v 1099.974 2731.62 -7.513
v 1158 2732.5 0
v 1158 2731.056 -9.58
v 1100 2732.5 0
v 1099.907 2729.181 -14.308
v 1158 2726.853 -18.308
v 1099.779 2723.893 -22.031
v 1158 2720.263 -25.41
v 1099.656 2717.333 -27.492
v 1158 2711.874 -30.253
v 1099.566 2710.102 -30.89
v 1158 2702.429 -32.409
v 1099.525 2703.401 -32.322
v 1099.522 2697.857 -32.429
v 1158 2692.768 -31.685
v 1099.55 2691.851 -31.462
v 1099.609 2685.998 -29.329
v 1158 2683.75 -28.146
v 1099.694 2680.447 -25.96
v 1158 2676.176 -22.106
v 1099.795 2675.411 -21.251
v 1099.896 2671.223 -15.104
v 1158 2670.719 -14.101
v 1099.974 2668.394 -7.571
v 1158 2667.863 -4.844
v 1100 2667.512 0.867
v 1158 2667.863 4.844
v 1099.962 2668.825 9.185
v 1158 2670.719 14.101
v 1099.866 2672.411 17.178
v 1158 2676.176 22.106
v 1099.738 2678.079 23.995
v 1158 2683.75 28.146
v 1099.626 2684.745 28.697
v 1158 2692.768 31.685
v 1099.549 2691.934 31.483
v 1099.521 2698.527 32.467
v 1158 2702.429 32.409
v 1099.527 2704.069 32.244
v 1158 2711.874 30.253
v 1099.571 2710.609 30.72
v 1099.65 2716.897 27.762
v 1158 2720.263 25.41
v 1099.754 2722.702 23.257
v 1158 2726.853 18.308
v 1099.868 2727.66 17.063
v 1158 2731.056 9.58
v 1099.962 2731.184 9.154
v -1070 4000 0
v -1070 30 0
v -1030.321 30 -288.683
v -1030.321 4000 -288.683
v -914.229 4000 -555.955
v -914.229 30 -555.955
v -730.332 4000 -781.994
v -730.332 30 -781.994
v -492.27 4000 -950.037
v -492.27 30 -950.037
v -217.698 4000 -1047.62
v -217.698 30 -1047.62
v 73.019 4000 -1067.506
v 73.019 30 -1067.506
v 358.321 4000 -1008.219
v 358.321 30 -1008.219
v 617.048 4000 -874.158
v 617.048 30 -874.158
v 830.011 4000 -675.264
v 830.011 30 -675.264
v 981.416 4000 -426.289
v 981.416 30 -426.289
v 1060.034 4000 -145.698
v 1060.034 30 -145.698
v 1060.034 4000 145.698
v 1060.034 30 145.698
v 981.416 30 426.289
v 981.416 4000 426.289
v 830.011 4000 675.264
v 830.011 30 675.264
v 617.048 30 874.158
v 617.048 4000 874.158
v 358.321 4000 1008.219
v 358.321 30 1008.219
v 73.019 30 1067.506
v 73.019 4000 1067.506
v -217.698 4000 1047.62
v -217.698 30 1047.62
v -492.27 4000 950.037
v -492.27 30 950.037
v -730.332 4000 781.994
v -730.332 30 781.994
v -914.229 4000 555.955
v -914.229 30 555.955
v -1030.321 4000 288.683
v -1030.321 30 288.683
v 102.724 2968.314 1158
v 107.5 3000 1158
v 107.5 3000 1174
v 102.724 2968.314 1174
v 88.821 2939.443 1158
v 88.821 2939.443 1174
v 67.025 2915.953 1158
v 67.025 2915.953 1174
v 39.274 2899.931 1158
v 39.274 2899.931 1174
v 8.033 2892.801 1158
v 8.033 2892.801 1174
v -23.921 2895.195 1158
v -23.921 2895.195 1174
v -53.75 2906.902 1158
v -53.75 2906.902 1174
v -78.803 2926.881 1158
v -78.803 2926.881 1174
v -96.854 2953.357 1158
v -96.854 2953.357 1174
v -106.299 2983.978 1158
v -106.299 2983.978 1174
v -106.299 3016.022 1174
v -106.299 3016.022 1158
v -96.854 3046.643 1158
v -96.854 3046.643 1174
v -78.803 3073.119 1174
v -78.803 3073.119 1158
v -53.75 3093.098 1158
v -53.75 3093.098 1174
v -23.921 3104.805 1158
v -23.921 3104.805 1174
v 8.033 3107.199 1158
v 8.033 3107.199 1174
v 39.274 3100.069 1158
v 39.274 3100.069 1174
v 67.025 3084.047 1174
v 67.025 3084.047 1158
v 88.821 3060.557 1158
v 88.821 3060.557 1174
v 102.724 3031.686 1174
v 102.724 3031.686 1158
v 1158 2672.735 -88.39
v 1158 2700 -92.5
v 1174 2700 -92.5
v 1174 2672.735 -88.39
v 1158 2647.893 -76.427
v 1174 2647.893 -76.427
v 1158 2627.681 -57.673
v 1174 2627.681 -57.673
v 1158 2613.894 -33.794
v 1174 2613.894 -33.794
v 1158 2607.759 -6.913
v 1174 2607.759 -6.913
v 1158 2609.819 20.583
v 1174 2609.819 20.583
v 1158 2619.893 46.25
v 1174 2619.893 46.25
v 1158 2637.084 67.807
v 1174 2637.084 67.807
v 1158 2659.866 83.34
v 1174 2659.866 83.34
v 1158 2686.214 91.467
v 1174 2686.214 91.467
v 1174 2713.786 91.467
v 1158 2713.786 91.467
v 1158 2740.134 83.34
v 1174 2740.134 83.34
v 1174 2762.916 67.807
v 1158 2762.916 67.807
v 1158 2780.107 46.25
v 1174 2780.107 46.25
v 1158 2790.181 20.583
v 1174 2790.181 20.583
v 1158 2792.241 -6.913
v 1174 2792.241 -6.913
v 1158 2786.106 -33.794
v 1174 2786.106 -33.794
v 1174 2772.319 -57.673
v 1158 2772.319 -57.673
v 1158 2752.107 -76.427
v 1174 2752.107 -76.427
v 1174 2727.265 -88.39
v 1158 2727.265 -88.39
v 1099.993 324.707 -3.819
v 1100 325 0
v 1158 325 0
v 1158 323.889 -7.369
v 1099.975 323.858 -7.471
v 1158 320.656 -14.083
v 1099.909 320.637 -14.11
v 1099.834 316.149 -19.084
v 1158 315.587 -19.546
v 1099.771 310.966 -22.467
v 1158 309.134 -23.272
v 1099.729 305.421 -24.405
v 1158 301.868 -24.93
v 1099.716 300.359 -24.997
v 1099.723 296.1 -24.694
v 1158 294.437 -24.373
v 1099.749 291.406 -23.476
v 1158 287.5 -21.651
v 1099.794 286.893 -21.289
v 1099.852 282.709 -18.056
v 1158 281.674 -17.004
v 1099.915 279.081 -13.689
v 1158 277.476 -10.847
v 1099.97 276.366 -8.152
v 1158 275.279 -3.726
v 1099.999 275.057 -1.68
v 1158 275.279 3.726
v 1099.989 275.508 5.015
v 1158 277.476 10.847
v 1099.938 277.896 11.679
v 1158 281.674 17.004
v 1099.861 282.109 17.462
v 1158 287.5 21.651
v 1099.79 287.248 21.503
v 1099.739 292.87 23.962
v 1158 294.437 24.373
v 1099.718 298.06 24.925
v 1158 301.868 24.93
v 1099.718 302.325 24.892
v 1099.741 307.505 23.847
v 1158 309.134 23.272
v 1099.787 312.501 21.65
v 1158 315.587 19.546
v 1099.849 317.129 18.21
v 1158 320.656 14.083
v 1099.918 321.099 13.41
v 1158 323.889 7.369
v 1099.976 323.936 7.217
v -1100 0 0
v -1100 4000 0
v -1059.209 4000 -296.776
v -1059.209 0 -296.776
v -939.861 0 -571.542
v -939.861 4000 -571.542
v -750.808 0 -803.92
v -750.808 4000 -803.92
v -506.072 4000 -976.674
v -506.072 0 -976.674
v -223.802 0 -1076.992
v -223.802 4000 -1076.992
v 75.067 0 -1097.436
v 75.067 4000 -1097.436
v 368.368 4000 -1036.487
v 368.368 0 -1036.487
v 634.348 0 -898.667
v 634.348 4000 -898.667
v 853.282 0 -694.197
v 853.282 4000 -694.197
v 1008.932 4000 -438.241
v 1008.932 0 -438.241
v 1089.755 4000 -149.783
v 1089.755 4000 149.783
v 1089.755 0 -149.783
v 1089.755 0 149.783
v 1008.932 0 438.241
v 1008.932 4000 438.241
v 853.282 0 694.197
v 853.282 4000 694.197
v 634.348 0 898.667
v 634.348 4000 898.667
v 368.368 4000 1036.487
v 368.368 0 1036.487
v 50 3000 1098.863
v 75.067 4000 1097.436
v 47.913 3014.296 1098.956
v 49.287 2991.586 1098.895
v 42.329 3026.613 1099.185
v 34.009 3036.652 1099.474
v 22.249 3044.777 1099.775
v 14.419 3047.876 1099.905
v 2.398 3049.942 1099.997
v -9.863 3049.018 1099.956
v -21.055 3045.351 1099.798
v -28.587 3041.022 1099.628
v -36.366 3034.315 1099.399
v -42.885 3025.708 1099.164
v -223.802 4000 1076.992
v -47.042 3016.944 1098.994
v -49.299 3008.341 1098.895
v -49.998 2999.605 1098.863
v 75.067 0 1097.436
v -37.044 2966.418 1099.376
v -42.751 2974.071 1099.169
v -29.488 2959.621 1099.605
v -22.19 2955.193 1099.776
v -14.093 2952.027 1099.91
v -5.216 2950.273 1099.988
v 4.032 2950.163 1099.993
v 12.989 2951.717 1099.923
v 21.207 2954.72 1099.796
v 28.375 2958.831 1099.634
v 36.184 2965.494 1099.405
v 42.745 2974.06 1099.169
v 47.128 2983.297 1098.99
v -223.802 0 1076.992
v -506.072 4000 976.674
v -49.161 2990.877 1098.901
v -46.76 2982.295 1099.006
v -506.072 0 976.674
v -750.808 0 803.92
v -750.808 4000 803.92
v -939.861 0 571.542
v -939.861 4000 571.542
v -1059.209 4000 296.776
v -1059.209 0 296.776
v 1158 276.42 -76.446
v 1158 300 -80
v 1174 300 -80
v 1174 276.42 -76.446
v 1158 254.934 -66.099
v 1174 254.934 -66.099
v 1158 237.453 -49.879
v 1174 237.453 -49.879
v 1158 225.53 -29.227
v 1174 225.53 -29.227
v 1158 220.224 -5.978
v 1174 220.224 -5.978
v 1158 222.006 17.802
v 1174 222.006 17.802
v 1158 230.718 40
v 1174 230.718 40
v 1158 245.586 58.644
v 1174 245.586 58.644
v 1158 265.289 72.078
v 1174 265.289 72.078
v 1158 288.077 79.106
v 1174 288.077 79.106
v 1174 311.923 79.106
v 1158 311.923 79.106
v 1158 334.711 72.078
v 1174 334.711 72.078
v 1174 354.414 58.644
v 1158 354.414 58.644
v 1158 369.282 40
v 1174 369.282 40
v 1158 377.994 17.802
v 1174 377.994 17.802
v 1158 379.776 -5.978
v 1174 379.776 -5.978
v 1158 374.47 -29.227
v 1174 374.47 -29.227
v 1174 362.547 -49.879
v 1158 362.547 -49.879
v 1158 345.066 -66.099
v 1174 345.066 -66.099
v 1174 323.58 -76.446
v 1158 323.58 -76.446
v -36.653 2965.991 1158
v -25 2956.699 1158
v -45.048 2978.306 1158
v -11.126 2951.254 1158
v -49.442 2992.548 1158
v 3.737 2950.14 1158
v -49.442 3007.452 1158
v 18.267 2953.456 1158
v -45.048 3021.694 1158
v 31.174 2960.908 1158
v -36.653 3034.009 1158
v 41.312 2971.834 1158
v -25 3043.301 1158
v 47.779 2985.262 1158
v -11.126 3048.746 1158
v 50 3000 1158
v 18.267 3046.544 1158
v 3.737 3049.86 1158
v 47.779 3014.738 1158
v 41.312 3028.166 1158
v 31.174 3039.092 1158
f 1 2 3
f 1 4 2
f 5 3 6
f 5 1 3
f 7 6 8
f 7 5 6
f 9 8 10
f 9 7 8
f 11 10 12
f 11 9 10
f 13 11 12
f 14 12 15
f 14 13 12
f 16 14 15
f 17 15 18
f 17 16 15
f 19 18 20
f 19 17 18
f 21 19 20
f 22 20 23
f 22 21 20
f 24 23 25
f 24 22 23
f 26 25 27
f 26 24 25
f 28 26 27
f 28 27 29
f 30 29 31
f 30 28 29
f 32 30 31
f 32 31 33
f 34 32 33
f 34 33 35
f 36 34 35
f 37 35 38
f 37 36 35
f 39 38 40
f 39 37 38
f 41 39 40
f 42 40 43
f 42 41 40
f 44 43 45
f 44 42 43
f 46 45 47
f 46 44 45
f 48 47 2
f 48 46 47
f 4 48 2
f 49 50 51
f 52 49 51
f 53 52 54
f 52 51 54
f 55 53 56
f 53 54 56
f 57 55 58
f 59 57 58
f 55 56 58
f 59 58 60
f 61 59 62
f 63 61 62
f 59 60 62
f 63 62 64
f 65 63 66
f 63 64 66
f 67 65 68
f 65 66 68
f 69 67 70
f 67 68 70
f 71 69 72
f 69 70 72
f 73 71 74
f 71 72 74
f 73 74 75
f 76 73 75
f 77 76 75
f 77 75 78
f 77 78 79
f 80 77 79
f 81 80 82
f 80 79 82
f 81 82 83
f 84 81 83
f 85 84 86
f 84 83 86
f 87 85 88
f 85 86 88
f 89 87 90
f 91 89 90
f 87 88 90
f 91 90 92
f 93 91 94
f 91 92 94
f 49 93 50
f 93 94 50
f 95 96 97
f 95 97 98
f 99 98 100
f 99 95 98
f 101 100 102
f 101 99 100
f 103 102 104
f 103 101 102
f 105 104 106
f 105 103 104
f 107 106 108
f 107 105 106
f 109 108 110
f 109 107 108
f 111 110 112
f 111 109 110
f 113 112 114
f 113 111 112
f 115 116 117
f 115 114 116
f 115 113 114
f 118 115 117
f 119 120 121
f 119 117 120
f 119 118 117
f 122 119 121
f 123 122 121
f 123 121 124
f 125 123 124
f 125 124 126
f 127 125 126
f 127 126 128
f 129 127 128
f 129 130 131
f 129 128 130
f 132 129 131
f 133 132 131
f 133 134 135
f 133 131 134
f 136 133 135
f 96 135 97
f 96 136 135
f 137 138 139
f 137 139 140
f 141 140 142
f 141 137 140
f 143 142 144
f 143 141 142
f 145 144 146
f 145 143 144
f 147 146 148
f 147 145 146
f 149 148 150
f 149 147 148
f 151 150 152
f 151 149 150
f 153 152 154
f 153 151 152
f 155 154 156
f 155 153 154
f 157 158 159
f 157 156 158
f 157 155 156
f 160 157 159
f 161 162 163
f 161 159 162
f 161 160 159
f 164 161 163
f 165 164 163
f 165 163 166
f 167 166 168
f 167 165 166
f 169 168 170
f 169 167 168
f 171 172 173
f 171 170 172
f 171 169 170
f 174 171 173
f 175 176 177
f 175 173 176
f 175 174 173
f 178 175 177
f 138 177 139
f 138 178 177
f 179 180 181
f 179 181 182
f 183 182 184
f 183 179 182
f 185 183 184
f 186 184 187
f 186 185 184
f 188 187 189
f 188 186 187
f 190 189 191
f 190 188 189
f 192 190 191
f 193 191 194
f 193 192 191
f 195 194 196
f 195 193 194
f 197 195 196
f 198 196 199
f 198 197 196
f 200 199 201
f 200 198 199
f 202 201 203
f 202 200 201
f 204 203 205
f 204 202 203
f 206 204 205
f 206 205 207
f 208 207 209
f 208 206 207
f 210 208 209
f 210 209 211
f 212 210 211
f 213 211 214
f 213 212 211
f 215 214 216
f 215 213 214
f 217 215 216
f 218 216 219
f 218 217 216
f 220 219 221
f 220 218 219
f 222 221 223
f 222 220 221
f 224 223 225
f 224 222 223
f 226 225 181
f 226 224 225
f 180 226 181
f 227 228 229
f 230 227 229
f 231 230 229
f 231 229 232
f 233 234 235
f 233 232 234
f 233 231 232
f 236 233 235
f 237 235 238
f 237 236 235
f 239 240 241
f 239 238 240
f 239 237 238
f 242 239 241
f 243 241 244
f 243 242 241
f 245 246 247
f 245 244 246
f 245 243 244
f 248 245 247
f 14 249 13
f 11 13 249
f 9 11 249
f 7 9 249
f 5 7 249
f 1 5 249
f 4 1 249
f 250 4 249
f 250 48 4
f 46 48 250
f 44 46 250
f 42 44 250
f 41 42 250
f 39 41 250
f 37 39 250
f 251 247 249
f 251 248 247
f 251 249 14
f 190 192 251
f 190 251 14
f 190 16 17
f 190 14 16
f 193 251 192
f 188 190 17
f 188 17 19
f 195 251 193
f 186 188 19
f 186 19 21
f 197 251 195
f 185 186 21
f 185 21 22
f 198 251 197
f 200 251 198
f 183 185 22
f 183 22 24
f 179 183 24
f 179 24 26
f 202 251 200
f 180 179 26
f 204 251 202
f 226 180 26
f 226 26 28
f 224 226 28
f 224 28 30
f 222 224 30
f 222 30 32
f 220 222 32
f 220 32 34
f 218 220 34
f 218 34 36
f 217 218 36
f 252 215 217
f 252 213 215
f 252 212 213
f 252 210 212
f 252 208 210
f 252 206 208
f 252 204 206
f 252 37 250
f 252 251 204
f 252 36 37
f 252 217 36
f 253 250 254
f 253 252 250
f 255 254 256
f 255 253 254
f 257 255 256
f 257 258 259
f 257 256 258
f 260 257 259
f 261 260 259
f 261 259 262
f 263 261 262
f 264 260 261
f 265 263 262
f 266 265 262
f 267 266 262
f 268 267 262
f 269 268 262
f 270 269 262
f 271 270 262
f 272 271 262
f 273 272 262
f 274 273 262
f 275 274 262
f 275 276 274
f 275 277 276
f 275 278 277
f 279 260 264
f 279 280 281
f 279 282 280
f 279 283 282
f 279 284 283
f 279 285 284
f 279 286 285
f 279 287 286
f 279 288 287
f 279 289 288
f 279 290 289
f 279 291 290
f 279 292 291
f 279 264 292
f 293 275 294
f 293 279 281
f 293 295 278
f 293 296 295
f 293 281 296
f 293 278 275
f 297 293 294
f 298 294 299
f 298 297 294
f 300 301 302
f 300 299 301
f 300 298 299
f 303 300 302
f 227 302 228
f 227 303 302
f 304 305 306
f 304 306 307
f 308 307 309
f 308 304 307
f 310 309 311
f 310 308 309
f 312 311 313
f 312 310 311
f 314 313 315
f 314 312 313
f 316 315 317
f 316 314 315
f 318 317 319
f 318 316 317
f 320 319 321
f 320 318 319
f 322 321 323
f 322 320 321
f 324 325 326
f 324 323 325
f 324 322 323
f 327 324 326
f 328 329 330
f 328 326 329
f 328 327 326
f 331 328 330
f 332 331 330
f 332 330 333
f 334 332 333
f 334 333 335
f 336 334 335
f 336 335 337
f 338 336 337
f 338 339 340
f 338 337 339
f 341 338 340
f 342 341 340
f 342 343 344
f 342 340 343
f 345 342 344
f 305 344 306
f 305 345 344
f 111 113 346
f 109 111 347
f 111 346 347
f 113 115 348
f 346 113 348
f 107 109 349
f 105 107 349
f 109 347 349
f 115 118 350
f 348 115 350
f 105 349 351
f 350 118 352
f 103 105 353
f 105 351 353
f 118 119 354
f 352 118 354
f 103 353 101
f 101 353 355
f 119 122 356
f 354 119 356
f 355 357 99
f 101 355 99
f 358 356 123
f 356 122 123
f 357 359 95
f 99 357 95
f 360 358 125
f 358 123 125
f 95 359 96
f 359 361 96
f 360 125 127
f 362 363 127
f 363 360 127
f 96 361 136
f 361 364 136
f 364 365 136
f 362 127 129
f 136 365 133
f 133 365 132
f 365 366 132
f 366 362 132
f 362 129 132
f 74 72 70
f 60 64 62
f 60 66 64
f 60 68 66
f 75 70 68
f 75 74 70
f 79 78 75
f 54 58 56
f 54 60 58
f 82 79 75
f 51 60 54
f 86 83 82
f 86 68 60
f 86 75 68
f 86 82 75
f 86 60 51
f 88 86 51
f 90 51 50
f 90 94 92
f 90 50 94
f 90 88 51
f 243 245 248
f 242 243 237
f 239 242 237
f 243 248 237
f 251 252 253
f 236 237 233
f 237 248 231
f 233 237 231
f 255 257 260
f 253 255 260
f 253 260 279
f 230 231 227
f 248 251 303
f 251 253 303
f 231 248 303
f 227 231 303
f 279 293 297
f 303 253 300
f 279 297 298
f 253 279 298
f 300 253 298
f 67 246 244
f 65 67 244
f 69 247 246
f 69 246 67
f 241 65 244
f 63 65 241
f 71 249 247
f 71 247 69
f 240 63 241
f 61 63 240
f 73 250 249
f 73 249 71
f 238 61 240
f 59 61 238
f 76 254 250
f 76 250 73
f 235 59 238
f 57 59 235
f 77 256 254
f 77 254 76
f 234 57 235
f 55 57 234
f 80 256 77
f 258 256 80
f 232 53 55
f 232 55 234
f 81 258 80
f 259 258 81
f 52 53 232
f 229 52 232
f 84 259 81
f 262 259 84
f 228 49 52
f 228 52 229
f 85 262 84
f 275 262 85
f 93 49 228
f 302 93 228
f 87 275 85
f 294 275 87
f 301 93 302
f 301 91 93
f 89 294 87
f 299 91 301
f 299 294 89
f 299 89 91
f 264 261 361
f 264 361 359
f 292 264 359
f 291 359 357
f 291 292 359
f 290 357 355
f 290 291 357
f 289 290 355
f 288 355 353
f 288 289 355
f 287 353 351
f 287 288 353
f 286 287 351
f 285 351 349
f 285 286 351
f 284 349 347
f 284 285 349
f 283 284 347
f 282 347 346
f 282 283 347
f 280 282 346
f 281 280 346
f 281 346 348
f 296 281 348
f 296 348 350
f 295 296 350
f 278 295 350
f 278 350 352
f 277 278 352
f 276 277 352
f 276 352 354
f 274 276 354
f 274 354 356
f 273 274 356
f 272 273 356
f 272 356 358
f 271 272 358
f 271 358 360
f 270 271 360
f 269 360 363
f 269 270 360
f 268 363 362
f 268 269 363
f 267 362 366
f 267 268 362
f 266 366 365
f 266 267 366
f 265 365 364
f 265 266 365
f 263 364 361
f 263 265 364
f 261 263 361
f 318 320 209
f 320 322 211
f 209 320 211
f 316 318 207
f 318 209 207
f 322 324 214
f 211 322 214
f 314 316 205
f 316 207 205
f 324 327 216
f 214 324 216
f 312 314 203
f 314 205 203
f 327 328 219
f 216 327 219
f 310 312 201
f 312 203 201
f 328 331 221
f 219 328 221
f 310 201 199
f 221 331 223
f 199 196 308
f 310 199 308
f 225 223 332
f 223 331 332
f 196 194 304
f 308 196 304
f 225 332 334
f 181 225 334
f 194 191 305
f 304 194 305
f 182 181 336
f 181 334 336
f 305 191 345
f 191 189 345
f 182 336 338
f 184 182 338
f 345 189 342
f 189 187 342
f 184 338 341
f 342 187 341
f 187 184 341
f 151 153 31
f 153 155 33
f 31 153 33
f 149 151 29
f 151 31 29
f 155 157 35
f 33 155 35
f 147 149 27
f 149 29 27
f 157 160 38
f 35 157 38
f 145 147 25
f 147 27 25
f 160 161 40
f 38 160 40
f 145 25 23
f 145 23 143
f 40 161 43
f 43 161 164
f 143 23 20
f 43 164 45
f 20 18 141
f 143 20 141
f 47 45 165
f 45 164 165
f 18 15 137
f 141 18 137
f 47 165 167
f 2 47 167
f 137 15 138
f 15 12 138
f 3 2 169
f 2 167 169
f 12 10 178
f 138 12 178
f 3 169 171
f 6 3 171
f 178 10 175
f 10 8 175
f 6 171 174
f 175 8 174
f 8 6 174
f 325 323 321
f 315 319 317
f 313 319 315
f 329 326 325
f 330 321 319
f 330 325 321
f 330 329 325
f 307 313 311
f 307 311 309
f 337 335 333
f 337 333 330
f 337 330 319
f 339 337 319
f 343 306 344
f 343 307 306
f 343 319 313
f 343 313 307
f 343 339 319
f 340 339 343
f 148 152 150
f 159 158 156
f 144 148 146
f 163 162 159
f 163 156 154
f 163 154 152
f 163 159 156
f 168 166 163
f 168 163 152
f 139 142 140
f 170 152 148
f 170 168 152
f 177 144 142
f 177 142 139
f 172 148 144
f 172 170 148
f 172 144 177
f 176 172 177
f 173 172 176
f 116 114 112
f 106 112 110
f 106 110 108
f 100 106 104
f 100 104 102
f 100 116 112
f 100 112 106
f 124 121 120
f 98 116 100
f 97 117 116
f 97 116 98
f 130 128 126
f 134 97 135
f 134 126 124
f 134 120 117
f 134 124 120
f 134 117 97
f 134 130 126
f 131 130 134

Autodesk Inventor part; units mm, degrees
ref_plane "XZ Plane" through (0, 0, 0) normal (0, 1, 0) x (-1, 0, 0)
sketch "Sketch1" plane through (0, 0, 0) normal (0, 1, 0) x (-1, 0, 0)
  circle A0 centre (0, 0) radius 1100
  dimension "d0" = 2200
extrude "Extrusion1" add sketch "Sketch1" along normal blind 4000
shell "Shell1" thickness 30 removed faces 1 at (308.7984, 4000, -93.6109)
ref_plane "Work Plane1" through (0, 0, 1085) normal (0, 0, 1) x (1, 0, 0)
sketch "Sketch2" plane through (0, 0, 1085) normal (0, 0, 1) x (1, 0, 0)
  circle A0 centre (0, 3000) radius 50
  line L0 (1100, 0) -> (-1100, 0) projected
  point P0 (0, 0)
  point P1 (0, 0)
  dimension "d5" = 100
  dimension "d7" = 3000
extrude "Extrusion2" add sketch "Sketch2" along normal blind 73
ref_plane "Work Plane3" through (1085, 0, 0) normal (1, 0, 0) x (0, 1, 0)
sketch "Sketch5" plane through (1085, 0, 0) normal (1, 0, 0) x (0, 1, 0)
  circle A0 centre (2700, 0) radius 32.5
  point P0 (0, 0)
  dimension "d17" = 65
  dimension "d18" = 2700
extrude "Extrusion4" add sketch "Sketch5" along normal blind 73
sketch "Sketch12" plane through (1085, 0, 0) normal (1, 0, 0) x (0, 1, 0)
  circle A0 centre (300, 0) radius 25
  point P0 (0, 0)
  dimension "d30" = 50
  dimension "d31" = 300
extrude "Extrusion8" add sketch "Sketch12" along normal blind 73
sketch "Sketch8" plane through (0, 3000, 1158) normal (0, 0, 1) x (1, 0, 0)
  circle A0 centre (0, 0) radius 50 projected
  circle A1 centre (0, 0) radius 107.5
  point P0 (0, -3000)
  dimension "d27" = 215
extrude "Extrusion7" add sketch "Sketch8" along normal blind 16 contours A0 | A1
sketch "Sketch6" plane through (1158, 2700, 0) normal (1, 0, 0) x (0, 0, -1)
  circle A0 centre (0, 0) radius 92.5
  circle A1 centre (0, 0) radius 32.5 projected
  point P0 (0, -2700)
  dimension "d21" = 185
extrude "Extrusion5" add sketch "Sketch6" along normal blind 16 contours A0 | A1
sketch "Sketch13" plane through (1158, 300, 0) normal (1, 0, 0) x (0, 0, -1)
  circle A0 centre (0, 0) radius 25 projected
  circle A1 centre (0, 0) radius 80
  point P0 (0, -300)
  dimension "d34" = 160
extrude "Extrusion9" add sketch "Sketch13" along normal blind 16 contours A0 | A1
properties part number "Резервуар сбора осветленной воды"
